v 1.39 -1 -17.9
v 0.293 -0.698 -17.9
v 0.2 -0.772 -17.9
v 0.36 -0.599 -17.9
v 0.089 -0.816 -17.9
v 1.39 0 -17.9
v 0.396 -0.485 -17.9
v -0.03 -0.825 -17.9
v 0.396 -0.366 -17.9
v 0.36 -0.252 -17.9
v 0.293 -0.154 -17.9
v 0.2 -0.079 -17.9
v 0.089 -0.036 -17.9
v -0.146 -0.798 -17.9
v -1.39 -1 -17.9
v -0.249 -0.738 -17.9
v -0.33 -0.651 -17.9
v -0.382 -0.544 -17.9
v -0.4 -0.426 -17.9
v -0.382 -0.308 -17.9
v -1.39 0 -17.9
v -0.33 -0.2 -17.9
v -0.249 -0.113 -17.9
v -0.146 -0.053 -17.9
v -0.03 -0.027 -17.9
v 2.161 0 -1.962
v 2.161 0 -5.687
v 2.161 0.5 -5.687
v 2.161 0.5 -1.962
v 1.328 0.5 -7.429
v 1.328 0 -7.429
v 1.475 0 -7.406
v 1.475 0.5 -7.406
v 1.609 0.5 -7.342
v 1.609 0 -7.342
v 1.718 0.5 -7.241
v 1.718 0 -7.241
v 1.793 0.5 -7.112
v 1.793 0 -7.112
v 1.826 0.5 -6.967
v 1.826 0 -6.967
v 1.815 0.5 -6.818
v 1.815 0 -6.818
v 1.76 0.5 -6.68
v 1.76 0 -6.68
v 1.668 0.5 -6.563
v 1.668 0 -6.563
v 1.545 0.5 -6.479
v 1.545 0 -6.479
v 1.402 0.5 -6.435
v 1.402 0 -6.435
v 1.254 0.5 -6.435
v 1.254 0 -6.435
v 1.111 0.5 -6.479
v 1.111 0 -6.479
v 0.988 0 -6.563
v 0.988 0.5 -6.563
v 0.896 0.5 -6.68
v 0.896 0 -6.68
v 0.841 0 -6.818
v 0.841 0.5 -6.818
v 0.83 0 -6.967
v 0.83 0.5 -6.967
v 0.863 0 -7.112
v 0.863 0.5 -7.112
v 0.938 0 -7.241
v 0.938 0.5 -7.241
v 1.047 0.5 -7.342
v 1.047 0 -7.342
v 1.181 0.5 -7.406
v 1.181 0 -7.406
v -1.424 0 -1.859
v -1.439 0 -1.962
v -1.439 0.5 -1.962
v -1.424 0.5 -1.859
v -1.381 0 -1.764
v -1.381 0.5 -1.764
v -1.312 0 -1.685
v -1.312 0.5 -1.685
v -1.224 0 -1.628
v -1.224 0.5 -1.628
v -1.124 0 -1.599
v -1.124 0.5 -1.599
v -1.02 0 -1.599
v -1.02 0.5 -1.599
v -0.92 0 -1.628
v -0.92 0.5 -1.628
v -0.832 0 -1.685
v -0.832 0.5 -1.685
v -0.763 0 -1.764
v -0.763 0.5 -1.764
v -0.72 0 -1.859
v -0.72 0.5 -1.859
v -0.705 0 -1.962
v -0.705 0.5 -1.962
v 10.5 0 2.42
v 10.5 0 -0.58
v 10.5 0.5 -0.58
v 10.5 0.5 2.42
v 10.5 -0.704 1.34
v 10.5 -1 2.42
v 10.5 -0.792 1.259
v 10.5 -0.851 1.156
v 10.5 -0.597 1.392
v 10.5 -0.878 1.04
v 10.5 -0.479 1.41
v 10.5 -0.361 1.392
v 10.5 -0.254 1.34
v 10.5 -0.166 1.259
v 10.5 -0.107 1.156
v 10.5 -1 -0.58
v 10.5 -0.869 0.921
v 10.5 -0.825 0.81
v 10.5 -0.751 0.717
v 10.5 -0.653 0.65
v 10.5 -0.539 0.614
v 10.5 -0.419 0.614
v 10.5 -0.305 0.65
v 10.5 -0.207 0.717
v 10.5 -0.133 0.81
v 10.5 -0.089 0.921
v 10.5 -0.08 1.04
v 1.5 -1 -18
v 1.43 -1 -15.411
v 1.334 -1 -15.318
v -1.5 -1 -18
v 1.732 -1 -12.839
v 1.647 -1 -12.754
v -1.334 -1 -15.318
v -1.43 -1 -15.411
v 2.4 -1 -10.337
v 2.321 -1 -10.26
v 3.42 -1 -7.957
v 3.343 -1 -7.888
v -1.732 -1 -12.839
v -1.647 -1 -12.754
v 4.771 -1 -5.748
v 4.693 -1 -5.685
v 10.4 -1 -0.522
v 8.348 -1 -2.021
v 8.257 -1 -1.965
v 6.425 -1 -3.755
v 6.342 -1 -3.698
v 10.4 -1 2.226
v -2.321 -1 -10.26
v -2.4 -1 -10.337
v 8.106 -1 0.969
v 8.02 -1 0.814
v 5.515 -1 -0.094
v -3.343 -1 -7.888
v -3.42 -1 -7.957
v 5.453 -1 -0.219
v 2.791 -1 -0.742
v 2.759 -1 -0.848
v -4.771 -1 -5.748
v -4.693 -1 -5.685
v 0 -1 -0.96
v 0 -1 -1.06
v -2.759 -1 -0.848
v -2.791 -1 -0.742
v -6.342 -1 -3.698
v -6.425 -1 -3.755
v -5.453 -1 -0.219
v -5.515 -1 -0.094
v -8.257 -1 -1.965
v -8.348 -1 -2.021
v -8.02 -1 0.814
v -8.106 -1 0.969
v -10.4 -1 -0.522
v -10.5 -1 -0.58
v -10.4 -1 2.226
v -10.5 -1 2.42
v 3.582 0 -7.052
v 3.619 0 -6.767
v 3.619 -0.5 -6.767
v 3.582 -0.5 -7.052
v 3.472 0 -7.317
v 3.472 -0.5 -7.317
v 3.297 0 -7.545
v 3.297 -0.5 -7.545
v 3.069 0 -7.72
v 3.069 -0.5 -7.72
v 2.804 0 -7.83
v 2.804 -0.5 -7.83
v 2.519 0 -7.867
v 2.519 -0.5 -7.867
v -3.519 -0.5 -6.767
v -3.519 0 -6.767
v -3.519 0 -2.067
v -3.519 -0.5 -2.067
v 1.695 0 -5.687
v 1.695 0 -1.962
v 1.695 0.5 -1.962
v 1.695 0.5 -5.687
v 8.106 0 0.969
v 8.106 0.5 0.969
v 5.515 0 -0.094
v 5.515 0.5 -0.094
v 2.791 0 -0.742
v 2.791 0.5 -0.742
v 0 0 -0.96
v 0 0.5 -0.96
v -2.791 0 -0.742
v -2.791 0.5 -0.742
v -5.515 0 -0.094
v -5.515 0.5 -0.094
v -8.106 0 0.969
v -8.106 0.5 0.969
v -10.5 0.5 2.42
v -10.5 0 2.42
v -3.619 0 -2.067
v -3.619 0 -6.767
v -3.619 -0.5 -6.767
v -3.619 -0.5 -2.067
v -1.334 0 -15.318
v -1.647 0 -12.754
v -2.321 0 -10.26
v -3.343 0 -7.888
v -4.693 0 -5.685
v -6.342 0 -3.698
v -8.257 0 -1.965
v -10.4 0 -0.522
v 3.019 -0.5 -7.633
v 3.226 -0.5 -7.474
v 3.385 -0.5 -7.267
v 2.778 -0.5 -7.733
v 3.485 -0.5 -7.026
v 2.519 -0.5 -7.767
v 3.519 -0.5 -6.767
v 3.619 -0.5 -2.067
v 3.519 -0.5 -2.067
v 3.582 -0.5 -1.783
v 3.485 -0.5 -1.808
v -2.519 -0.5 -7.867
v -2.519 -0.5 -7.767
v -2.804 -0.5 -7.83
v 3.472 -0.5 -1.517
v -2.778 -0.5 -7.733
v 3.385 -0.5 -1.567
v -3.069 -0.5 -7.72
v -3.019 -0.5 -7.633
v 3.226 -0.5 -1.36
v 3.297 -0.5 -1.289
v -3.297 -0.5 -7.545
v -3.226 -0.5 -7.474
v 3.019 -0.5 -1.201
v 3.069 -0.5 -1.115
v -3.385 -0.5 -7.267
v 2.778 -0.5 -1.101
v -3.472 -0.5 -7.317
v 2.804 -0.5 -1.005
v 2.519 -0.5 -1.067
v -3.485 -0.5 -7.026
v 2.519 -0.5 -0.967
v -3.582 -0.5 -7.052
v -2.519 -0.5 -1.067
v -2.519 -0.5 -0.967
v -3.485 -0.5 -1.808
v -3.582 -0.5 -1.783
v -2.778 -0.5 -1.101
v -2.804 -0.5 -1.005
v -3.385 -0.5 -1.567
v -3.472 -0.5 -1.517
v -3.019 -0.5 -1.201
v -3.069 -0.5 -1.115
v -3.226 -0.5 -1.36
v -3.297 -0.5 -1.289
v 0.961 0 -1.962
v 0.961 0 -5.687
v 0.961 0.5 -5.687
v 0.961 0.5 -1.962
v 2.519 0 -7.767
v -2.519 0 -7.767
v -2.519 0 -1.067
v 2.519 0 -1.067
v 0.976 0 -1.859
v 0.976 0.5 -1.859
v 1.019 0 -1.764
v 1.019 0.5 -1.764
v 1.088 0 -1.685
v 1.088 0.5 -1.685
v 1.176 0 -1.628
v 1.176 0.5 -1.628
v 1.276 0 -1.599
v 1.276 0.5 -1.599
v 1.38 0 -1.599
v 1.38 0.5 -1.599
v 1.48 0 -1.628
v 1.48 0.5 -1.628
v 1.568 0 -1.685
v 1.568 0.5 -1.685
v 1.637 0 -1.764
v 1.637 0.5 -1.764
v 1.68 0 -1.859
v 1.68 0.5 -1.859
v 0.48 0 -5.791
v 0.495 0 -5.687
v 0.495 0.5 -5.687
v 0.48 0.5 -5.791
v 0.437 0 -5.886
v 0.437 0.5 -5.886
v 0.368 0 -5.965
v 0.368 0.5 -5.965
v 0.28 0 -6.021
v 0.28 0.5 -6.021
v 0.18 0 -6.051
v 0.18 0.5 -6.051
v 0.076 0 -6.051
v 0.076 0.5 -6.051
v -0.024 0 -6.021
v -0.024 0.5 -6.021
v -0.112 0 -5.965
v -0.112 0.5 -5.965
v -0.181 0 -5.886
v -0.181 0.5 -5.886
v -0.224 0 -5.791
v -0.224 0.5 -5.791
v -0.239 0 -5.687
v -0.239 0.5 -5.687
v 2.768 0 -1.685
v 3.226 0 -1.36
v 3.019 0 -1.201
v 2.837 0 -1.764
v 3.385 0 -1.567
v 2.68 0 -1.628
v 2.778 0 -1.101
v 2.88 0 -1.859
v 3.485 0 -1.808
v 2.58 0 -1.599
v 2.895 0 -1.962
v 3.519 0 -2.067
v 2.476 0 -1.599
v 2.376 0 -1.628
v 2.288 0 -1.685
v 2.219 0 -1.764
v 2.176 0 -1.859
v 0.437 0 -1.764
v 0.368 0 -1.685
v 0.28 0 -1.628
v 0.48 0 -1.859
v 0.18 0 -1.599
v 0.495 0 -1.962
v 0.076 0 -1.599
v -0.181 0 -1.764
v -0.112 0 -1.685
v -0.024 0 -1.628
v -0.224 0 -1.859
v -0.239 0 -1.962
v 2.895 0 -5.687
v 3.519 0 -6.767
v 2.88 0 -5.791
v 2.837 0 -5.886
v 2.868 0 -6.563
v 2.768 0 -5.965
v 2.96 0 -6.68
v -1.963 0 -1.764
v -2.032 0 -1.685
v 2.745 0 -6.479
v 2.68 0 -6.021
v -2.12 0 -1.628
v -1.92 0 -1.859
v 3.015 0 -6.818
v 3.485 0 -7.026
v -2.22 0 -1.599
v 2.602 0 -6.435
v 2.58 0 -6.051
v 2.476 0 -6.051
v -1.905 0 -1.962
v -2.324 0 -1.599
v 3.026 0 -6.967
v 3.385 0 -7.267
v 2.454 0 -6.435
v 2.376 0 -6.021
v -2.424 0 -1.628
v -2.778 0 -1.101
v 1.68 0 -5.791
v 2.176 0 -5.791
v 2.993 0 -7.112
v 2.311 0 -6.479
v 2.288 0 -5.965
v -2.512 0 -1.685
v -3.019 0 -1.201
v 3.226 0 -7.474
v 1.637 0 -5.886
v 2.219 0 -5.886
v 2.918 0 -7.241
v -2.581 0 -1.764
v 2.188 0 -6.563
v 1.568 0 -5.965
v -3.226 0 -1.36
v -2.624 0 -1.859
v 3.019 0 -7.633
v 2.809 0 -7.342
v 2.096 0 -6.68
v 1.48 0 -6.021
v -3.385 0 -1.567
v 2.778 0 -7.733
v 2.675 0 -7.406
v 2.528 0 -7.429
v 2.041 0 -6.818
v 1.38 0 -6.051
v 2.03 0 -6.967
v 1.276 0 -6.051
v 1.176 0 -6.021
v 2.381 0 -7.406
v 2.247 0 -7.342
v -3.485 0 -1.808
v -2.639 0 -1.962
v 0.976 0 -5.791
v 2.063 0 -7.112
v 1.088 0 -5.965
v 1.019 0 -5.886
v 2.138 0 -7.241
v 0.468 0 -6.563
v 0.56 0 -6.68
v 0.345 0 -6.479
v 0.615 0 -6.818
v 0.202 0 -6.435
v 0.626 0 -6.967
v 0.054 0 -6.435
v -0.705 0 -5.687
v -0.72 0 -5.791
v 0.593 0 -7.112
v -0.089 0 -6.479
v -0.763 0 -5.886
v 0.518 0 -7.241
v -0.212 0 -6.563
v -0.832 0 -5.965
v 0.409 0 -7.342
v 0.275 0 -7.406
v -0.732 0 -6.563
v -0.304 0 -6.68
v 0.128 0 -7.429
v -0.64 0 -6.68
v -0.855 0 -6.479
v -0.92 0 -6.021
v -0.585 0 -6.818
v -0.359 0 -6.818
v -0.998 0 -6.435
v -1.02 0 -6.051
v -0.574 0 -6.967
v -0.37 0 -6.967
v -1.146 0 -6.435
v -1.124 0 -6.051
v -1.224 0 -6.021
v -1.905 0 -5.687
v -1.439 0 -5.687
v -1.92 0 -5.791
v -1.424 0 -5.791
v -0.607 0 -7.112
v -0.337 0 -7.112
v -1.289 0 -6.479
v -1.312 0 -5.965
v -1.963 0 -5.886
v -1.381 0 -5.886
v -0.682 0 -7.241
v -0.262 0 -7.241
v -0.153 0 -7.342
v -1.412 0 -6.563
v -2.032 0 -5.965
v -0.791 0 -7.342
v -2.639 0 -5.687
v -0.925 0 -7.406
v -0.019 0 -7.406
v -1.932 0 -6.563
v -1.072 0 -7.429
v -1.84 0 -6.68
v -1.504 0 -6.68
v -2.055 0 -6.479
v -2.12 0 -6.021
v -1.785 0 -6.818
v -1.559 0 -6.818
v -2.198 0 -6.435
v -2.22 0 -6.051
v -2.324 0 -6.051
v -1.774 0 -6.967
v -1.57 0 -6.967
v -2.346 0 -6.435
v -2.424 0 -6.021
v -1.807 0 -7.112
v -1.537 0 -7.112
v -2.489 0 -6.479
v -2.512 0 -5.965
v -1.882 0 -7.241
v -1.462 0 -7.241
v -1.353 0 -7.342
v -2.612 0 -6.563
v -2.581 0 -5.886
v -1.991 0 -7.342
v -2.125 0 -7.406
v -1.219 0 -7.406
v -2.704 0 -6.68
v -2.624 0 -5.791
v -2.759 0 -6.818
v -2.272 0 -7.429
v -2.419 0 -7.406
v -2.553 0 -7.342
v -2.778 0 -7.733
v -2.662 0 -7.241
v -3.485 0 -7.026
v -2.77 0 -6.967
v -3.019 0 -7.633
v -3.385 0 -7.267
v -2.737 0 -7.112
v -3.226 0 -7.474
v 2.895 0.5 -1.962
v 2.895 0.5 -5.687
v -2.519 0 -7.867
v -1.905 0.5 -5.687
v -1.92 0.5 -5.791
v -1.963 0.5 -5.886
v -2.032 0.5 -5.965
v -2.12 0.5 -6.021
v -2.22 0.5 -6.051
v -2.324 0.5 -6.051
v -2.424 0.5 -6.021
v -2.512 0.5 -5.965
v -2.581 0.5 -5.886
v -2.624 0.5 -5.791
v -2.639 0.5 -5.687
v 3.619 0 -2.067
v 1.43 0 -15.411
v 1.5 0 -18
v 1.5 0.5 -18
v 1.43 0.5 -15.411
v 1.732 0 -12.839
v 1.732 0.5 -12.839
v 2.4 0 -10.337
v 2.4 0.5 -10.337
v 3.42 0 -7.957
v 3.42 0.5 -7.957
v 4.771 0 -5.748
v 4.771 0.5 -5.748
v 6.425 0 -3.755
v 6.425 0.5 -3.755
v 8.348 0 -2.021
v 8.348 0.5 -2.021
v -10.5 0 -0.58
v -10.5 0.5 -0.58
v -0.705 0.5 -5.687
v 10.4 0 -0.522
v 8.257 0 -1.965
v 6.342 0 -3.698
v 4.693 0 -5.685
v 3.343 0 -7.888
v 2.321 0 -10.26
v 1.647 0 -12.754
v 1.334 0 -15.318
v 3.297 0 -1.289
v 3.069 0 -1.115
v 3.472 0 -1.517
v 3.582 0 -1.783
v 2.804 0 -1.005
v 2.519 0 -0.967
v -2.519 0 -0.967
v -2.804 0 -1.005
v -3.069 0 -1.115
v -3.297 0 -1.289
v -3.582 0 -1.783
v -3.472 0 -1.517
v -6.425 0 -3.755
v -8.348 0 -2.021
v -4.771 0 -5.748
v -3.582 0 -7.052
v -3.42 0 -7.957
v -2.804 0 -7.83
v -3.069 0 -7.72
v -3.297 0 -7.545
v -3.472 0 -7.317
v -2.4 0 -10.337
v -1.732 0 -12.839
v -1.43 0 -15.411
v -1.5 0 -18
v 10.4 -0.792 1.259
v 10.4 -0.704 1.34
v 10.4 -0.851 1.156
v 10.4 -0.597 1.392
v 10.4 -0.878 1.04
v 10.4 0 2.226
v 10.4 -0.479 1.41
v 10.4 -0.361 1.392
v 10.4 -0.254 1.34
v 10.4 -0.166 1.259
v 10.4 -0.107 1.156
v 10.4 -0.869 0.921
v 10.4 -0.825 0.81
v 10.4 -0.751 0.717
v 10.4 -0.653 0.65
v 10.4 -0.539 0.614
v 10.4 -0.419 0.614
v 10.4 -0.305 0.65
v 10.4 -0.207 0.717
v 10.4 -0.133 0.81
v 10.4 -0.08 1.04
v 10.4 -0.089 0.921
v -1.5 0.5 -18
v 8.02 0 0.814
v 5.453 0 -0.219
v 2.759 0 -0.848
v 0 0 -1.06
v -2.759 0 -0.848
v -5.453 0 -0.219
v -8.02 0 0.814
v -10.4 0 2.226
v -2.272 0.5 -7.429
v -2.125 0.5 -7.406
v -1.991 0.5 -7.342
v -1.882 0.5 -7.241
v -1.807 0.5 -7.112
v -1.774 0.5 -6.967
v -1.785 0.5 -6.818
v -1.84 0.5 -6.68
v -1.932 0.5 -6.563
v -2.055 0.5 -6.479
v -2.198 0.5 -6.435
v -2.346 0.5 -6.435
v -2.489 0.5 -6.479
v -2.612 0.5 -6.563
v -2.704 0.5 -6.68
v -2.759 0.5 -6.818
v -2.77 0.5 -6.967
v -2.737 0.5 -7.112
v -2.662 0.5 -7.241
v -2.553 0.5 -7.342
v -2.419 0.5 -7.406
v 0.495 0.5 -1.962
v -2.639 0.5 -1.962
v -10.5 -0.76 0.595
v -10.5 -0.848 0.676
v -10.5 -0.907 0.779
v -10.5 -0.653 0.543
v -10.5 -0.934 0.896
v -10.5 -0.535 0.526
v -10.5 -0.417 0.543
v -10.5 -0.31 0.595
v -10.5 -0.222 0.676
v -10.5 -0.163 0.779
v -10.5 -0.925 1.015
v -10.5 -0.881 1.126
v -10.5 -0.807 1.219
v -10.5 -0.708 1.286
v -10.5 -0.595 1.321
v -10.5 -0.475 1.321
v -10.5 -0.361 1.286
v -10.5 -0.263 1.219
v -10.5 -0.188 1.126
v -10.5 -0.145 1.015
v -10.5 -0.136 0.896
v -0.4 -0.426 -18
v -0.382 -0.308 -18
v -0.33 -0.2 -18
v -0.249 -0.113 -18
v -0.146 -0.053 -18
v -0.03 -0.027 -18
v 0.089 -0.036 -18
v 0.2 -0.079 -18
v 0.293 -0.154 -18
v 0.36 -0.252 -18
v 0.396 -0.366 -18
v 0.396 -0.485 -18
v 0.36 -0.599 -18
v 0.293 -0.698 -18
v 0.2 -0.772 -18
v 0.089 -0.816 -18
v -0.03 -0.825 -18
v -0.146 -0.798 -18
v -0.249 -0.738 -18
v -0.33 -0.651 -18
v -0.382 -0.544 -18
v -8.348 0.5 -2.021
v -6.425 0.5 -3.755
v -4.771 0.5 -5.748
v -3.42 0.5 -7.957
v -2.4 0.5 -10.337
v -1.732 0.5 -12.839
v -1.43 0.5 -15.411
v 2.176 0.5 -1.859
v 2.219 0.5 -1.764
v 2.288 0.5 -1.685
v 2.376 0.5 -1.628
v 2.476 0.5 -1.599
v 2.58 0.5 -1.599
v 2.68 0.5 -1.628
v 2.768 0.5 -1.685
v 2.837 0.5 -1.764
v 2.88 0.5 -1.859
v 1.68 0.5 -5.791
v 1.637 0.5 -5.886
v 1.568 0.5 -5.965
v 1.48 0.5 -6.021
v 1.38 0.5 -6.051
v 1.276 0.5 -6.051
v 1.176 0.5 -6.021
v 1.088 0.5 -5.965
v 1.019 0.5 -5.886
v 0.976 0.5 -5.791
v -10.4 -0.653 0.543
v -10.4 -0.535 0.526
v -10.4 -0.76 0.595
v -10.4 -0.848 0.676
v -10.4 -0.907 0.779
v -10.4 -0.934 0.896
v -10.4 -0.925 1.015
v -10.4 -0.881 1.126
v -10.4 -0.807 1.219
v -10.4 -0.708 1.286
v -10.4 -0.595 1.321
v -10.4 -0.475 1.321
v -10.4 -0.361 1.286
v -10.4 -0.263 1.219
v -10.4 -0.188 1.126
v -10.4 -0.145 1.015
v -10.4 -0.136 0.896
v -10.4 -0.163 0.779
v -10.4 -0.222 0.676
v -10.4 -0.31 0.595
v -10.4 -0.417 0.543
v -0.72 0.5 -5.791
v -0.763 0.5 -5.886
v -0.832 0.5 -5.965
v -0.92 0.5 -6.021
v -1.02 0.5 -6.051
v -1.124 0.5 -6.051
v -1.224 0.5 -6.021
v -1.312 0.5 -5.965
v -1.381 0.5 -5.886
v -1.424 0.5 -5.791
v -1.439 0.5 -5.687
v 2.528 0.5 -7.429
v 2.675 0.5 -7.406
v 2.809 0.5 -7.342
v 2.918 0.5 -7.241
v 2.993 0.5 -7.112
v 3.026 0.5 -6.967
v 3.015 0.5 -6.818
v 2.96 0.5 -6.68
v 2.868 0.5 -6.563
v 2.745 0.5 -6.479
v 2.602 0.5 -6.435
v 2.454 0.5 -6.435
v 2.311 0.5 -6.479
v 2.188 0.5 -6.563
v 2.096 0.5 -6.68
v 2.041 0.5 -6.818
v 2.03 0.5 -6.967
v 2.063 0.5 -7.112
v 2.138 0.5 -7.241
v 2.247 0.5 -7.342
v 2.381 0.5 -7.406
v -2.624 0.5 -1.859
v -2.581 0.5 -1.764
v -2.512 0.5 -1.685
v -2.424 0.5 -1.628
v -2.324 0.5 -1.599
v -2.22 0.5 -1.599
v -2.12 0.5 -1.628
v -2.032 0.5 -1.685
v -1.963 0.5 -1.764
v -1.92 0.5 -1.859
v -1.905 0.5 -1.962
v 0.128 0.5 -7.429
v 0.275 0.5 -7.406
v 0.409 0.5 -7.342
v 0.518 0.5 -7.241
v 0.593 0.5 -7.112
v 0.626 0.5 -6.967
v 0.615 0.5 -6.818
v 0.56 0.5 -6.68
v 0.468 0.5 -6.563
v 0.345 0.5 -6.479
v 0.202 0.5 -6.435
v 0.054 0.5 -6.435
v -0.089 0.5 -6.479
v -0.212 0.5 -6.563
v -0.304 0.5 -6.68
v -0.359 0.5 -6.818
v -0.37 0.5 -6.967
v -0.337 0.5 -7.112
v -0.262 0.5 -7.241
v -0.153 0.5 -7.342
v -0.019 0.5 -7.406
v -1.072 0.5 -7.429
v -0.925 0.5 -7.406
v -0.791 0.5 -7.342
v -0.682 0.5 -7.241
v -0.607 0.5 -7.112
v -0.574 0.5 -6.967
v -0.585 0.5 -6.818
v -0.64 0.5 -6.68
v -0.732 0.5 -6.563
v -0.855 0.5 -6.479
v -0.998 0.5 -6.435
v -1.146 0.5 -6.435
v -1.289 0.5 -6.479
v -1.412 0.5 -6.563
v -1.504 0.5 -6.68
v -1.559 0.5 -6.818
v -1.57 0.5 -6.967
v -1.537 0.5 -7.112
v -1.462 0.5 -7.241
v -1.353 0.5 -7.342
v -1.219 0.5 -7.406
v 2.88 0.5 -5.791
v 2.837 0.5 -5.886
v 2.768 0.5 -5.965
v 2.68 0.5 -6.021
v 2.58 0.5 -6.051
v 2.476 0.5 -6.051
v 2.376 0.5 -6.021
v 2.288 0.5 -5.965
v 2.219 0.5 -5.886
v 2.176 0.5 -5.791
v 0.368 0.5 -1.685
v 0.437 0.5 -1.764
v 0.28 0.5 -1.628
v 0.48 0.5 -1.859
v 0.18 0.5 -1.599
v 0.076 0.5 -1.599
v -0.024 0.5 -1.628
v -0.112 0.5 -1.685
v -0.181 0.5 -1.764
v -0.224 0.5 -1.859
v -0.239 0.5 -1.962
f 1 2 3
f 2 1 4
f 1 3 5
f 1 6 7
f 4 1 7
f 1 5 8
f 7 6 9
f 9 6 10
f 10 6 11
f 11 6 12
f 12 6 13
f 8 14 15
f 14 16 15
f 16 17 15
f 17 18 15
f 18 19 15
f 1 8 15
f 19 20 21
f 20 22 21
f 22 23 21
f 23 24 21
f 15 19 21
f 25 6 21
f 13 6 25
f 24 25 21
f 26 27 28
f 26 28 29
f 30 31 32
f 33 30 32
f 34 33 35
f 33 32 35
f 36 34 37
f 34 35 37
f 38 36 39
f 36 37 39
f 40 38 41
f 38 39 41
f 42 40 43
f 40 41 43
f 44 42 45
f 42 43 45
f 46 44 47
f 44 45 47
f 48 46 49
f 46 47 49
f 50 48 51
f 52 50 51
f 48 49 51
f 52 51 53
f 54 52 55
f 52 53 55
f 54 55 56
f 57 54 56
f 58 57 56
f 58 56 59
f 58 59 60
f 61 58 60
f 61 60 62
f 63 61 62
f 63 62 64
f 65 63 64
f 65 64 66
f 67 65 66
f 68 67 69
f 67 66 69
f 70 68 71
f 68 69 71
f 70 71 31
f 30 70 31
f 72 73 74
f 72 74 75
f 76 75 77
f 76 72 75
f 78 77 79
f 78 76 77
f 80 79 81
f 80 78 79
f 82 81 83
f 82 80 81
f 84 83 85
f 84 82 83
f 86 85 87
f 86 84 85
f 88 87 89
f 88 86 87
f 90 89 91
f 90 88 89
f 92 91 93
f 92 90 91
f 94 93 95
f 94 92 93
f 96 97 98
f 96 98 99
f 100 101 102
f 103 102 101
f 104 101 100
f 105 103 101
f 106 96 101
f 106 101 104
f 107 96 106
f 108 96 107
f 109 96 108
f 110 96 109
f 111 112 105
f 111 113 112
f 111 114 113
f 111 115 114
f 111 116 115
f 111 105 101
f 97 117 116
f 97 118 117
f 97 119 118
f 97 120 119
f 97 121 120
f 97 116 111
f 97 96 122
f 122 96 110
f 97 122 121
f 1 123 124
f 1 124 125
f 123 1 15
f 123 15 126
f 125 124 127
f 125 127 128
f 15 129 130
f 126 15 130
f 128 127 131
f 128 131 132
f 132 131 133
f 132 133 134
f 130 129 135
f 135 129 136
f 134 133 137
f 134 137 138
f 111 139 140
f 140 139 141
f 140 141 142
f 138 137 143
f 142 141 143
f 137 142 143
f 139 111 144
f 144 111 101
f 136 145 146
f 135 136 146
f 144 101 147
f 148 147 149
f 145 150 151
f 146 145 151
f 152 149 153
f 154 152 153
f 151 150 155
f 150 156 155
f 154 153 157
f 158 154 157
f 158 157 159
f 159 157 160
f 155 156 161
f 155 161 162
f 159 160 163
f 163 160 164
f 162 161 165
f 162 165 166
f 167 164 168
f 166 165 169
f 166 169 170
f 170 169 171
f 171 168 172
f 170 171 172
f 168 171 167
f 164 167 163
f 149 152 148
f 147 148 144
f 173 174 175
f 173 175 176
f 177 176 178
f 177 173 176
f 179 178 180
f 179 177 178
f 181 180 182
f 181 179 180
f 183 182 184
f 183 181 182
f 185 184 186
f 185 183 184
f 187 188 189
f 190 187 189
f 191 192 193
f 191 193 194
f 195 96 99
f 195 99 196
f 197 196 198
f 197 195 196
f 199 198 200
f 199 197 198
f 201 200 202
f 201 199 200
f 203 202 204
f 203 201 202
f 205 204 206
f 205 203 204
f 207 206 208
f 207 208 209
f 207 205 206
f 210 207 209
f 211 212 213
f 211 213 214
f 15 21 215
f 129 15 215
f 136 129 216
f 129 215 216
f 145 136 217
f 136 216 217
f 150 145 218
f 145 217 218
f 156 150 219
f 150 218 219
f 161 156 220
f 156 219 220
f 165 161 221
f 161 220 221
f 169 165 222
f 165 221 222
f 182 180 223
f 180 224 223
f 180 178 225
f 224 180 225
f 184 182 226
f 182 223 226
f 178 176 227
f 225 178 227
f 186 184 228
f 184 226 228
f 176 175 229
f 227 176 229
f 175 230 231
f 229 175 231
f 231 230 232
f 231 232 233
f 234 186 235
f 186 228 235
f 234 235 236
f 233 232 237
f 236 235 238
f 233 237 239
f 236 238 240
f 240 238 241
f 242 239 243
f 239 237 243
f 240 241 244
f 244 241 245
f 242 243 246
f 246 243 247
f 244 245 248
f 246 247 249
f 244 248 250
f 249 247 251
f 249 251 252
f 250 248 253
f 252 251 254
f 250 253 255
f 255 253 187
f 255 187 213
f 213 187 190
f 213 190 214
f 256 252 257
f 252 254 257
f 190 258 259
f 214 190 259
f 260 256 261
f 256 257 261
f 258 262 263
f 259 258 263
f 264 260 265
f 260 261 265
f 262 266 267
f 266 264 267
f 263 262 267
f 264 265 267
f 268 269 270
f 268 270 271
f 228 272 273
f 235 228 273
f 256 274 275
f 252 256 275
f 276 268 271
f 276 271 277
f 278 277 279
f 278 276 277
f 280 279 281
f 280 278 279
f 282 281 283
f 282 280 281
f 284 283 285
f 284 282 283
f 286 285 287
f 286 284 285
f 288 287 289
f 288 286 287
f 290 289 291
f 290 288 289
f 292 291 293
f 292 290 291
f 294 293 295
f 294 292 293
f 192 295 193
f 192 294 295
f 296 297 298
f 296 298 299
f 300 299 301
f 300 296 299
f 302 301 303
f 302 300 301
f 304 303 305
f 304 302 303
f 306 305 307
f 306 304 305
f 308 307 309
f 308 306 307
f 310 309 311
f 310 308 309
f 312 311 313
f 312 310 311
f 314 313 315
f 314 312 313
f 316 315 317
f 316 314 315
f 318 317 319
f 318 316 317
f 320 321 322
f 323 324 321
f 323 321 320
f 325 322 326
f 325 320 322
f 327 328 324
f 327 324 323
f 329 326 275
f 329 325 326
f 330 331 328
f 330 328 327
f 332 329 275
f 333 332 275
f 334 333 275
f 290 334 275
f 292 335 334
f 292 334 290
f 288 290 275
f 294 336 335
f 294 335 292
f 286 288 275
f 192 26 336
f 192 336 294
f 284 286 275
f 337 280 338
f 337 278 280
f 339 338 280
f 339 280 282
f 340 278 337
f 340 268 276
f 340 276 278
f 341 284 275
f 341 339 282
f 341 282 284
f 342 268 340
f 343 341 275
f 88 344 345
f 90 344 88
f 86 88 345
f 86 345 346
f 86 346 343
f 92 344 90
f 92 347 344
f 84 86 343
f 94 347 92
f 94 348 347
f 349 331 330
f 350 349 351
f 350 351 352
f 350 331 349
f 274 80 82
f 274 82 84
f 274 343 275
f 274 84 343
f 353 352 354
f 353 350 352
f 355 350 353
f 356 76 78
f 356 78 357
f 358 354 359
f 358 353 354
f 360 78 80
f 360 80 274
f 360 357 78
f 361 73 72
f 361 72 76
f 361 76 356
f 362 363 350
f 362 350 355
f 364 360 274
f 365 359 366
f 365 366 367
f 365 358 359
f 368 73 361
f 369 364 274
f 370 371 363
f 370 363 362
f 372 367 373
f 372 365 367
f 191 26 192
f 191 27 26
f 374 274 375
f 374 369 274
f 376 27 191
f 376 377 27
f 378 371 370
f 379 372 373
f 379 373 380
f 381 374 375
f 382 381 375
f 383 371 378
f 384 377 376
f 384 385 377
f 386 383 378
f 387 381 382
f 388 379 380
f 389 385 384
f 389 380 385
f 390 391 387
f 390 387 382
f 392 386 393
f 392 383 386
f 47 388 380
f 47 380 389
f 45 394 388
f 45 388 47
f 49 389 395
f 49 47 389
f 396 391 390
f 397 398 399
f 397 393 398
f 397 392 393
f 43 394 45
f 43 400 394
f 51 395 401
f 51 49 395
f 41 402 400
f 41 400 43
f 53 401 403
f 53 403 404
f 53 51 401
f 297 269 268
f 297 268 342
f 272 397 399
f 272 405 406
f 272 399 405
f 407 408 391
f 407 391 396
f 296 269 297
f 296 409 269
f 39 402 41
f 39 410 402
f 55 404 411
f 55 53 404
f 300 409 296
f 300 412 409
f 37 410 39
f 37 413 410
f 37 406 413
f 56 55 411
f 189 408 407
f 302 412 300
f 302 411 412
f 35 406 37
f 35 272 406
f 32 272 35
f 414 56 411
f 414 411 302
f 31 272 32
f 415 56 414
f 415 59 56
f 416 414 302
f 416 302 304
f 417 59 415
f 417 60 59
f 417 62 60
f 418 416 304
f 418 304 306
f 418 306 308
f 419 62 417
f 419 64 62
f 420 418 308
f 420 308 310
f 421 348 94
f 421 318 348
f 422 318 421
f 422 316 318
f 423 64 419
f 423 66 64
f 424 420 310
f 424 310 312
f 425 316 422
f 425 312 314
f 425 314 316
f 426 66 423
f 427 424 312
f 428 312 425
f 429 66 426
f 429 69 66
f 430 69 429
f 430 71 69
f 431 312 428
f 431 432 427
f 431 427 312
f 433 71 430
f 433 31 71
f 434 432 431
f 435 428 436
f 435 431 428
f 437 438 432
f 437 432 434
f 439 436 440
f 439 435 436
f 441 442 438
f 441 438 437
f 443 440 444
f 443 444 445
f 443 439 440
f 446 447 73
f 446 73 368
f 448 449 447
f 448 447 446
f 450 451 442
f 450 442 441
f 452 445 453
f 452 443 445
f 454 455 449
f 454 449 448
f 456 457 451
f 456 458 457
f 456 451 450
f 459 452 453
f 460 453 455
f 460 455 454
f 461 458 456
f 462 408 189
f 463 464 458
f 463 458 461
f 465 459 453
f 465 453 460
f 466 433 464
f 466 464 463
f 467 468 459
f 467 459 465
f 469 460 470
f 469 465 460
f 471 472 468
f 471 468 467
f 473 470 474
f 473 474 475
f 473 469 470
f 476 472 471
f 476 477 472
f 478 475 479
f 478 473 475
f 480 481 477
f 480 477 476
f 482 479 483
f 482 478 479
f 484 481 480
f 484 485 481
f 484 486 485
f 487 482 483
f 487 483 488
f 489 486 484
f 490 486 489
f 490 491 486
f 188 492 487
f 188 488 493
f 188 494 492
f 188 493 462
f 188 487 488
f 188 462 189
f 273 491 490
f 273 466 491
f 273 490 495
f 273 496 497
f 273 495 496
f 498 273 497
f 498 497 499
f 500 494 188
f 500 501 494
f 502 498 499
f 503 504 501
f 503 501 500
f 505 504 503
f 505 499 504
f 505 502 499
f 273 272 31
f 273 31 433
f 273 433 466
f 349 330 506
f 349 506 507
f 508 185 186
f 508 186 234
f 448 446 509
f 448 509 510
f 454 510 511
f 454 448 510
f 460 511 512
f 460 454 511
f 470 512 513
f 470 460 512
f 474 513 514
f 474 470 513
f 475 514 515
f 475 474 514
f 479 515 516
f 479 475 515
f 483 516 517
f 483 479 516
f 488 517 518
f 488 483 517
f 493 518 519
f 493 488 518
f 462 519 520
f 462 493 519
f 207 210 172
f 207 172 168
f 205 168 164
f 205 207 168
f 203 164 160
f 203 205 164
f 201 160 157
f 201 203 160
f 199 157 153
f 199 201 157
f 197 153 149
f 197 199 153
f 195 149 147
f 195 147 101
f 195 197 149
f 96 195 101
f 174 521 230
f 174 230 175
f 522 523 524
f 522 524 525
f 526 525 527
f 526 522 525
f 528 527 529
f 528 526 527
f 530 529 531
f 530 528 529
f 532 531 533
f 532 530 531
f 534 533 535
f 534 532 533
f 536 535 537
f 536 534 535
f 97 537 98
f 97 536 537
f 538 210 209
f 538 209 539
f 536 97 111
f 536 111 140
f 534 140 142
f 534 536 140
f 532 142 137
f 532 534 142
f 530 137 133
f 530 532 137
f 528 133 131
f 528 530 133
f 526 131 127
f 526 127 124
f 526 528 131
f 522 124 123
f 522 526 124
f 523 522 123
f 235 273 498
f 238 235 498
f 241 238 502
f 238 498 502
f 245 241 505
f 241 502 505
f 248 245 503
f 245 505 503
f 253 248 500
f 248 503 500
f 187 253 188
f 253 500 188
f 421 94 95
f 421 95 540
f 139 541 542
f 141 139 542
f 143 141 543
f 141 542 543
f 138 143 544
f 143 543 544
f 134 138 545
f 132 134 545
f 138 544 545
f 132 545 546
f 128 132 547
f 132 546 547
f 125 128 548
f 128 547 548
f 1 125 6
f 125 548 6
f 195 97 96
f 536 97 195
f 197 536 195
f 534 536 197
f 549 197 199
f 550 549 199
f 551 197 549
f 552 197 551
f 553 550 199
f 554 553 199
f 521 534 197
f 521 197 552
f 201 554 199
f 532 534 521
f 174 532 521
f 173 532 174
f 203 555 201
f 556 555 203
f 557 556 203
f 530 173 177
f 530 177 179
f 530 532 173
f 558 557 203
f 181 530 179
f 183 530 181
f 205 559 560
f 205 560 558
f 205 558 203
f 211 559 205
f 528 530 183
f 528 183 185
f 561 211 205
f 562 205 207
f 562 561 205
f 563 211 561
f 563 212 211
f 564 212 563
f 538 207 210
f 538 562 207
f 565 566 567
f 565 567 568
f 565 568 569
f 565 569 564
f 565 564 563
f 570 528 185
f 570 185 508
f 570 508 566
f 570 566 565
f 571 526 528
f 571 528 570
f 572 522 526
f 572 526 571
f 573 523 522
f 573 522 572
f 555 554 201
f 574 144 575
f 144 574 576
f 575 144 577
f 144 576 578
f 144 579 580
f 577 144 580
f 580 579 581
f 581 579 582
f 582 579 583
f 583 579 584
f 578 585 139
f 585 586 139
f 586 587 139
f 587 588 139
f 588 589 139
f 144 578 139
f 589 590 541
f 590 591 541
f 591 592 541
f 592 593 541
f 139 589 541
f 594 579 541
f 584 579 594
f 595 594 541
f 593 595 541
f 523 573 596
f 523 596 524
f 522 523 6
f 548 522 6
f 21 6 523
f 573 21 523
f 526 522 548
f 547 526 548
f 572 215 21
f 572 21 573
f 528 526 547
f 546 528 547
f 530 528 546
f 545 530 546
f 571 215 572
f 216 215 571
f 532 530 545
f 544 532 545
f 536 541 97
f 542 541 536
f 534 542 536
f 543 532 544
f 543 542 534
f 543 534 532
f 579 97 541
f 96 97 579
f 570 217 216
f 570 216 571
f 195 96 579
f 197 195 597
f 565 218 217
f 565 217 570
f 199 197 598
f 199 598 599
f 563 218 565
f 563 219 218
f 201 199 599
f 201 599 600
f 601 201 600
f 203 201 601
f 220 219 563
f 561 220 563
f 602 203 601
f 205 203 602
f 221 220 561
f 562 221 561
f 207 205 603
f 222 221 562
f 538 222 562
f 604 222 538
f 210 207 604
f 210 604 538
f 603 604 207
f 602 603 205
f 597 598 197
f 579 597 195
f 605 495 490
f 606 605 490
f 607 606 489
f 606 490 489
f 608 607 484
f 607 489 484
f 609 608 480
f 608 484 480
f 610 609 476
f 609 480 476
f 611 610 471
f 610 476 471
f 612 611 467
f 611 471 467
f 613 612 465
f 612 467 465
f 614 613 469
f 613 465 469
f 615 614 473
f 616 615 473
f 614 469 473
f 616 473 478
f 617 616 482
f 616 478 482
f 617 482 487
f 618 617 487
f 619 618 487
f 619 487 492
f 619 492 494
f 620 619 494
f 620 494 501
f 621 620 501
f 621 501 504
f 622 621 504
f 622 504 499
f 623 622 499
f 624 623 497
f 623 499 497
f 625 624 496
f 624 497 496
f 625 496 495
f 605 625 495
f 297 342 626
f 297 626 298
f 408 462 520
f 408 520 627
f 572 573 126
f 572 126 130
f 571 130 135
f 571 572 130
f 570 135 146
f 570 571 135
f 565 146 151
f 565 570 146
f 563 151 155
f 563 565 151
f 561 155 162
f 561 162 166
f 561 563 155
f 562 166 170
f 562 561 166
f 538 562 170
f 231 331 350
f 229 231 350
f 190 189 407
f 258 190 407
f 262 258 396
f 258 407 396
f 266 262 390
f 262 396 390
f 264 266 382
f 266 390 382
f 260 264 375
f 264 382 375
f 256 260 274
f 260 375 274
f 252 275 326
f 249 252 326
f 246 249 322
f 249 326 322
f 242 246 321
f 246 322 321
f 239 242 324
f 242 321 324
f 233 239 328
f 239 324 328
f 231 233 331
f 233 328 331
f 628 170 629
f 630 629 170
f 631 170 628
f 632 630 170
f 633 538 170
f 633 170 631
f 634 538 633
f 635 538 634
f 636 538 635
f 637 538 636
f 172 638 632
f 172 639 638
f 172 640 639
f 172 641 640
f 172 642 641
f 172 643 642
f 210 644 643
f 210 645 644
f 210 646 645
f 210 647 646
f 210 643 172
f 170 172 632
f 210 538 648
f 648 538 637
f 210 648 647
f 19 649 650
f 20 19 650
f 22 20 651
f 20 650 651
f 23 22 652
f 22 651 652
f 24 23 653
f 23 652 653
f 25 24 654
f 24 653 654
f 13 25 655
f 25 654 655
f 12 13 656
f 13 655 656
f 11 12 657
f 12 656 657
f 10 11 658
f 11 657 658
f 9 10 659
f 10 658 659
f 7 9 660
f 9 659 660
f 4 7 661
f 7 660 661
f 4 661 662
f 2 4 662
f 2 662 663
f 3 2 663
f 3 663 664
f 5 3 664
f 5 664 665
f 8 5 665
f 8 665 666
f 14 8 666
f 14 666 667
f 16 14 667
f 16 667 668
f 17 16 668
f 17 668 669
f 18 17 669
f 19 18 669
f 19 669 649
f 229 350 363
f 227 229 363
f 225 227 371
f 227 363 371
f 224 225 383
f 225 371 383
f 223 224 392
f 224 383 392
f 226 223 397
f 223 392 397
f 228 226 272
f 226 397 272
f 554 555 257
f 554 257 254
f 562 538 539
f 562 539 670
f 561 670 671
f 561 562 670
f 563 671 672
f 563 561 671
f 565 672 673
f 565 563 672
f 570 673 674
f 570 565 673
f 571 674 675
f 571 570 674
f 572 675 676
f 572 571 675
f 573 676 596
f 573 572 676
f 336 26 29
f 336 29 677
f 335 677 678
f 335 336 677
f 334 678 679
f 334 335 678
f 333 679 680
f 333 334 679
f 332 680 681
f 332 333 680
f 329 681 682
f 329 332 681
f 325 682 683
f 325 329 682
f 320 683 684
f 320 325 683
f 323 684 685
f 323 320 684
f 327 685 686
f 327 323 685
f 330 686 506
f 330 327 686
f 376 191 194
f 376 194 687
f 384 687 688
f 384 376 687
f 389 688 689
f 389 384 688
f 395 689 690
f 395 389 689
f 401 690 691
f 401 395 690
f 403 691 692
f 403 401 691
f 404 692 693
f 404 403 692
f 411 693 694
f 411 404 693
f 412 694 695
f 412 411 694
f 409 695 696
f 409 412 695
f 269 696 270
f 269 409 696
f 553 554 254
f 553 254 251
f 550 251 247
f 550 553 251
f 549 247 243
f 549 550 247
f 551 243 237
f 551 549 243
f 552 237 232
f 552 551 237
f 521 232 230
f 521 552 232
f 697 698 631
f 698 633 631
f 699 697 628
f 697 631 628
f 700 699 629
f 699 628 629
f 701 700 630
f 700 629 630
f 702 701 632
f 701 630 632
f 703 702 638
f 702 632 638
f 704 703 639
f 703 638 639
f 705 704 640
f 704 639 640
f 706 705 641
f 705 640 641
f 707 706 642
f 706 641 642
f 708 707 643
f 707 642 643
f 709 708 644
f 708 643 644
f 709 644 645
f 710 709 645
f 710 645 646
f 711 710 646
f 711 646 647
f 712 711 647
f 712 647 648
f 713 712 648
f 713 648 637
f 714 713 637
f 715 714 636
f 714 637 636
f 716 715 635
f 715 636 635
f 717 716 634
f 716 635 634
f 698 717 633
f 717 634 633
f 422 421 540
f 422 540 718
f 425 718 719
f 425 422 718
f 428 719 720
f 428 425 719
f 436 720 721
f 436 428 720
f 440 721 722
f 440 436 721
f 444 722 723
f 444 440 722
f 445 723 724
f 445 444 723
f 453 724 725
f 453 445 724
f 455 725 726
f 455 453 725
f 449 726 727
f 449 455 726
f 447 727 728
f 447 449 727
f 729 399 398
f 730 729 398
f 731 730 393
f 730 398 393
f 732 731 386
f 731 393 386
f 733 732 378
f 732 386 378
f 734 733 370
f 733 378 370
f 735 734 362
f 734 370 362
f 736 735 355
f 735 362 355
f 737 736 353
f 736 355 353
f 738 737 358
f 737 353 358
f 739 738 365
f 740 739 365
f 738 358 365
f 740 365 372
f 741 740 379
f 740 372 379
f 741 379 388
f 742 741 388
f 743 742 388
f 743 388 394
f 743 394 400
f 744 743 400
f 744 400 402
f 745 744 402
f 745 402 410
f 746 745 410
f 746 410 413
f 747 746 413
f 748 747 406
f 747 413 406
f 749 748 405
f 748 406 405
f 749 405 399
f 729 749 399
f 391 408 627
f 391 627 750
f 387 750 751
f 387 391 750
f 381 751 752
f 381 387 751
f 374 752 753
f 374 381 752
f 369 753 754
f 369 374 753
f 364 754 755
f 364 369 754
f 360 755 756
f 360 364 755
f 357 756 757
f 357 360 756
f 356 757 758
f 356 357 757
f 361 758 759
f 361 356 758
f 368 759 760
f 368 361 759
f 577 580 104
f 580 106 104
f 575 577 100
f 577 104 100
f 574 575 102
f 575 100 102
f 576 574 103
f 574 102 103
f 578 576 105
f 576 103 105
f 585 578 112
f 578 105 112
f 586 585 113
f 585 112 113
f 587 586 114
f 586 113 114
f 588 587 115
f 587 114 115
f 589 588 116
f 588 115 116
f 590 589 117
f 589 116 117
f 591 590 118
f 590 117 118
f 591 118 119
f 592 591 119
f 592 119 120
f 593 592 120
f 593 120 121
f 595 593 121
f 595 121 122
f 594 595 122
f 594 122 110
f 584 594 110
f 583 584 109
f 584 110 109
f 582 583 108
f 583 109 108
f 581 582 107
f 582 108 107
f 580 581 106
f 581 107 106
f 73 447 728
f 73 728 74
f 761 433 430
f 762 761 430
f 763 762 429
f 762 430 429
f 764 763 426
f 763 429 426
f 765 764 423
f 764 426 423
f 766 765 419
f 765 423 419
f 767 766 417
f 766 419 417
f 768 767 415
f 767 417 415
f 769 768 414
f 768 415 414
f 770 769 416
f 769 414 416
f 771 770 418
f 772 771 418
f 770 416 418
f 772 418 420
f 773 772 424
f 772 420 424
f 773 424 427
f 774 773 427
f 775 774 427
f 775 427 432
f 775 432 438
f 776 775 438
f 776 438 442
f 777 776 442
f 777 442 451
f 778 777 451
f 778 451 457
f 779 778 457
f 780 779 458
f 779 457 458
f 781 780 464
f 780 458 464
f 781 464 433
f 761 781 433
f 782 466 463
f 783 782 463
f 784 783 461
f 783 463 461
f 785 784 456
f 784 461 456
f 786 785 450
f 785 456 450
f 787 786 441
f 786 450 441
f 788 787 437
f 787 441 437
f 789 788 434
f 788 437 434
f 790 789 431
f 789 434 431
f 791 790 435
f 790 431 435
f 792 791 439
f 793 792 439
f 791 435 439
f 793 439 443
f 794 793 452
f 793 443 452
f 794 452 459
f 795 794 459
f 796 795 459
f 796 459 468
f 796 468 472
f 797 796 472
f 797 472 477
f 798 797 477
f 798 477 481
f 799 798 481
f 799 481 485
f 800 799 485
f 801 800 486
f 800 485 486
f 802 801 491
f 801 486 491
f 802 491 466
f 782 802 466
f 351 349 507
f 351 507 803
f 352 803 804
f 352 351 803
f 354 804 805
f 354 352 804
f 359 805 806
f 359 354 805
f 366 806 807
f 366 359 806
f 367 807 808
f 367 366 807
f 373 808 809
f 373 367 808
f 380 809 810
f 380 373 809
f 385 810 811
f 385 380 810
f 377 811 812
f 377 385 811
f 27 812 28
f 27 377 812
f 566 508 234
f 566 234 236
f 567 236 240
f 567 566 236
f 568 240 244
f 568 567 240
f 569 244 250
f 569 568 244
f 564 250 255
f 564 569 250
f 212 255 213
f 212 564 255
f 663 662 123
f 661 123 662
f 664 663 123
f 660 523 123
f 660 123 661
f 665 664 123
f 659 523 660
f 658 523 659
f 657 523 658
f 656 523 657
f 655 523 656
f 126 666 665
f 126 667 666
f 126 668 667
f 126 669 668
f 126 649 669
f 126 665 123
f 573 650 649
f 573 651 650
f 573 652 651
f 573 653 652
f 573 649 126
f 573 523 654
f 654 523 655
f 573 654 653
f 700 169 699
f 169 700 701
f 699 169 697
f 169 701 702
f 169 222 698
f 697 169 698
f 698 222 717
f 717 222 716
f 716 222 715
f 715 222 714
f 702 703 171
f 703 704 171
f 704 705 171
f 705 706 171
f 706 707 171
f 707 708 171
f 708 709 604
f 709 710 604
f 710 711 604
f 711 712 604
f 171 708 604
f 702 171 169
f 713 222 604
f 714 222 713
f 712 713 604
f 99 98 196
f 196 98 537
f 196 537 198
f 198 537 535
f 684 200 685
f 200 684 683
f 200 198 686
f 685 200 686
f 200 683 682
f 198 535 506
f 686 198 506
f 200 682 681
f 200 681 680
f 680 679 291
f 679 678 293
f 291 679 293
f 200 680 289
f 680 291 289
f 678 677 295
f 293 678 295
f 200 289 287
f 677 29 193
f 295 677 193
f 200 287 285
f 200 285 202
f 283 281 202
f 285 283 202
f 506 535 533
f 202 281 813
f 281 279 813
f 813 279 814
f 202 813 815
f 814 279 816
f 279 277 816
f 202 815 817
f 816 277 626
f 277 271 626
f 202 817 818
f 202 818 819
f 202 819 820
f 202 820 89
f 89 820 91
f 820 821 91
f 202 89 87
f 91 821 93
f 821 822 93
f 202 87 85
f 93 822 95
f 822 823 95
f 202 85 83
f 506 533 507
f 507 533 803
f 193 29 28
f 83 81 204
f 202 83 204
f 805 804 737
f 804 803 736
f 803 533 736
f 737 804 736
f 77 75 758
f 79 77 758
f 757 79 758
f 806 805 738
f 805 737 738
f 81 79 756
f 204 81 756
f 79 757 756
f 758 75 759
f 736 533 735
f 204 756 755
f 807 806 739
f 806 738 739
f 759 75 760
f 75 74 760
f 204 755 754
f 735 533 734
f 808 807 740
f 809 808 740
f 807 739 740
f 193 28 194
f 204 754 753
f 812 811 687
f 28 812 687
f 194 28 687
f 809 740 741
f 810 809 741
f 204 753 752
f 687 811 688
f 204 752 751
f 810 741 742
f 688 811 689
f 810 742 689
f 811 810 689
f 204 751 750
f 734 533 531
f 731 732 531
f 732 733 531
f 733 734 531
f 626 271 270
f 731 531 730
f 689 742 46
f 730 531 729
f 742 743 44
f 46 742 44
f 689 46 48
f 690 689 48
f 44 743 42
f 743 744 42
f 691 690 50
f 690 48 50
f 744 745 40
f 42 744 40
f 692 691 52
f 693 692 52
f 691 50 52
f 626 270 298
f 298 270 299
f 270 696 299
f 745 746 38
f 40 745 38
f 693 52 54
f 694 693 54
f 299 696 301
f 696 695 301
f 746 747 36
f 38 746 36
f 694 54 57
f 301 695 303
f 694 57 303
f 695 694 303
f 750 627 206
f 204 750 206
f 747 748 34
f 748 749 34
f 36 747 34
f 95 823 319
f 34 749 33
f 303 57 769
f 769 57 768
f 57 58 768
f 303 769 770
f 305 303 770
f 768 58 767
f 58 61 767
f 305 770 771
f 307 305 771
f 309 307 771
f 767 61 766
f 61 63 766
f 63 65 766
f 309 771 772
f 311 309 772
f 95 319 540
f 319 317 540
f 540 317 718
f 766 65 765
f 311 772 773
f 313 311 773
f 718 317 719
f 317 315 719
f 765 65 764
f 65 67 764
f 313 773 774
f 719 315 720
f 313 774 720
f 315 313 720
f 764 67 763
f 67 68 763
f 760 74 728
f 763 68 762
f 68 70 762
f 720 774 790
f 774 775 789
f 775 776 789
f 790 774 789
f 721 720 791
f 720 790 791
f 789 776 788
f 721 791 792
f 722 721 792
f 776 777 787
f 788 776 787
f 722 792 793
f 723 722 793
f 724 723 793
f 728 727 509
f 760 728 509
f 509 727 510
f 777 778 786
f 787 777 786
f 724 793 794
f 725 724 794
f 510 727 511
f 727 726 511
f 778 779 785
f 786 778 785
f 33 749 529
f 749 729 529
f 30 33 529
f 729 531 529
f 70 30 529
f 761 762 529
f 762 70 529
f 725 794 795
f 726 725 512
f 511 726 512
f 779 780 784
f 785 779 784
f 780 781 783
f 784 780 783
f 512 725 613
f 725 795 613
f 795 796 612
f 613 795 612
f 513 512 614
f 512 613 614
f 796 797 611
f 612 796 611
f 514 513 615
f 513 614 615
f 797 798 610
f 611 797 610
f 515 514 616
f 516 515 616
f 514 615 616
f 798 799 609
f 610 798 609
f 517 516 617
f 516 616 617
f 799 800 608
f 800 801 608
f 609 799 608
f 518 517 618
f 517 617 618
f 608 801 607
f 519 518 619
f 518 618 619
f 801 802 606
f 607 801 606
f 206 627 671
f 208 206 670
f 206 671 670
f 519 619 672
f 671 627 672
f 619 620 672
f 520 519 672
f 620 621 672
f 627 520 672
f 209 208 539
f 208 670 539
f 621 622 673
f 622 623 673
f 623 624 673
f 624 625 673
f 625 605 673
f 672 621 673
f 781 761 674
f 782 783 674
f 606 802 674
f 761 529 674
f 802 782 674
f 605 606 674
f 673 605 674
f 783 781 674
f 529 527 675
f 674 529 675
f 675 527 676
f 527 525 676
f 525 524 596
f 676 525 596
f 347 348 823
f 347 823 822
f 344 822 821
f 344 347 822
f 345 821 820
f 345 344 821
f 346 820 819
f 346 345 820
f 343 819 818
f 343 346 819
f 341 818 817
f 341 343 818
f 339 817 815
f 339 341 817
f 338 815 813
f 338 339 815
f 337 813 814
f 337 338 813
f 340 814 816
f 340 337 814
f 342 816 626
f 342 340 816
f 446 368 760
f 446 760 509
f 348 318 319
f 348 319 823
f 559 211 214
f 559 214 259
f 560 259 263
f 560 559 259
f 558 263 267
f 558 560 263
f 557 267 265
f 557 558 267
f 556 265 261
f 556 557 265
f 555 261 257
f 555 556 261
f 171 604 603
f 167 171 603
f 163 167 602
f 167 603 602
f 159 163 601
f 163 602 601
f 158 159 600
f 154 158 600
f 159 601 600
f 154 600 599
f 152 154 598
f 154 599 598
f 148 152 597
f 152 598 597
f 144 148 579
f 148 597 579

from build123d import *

# Parameters (mm, degrees)
BOSS_EXTRUDE1_DEPTH = 0.5
EXTRUDE_THIN2_DEPTH = 0.5
SKETCH4_R           = 0.499321112
CUT_EXTRUDE1_DEPTH  = 0.5
EXTRUDE_THIN3_DEPTH = 1
SKETCH12_R          = 0.4
CUT_EXTRUDE2_DEPTH  = 0.5
SKETCH13_R          = 0.4
CUT_EXTRUDE3_DEPTH  = 0.5
SKETCH14_R          = 0.4
CUT_EXTRUDE4_DEPTH  = 1


with BuildPart() as part:
    # Sketch1 → Boss-Extrude1 (new body)
    with BuildSketch(Plane(origin=(0, 0, 0), x_dir=(1, 0, 0), z_dir=(0, 1, 0))):
        with BuildLine():
            Line((10.5, 0.58), (10.5, -2.42))
            ThreePointArc((10.5, -2.42), (0, 0.959808483), (-10.5, -2.42))
            Line((-10.5, -2.42), (-10.5, 0.58))
            ThreePointArc((-10.5, 0.58), (-3.419893457, 7.956994323), (-1.5, 18))
            Line((-1.5, 18), (1.5, 18))
            ThreePointArc((1.5, 18), (3.419893457, 7.956994323), (10.5, 0.58))
        make_face()
    extrude(amount=BOSS_EXTRUDE1_DEPTH)

    # Sketch2 → Extrude-Thin2 (add)
    with BuildSketch(Plane.XZ):
        with BuildLine():
            Line((3.619286336, -2.06724443), (3.619286336, -6.76738737))
            ThreePointArc((3.619286336, -6.76738737), (3.297103795, -7.545204829), (2.519286336, -7.86738737))
            Line((2.519286336, -7.86738737), (-2.519286336, -7.86738737))
            ThreePointArc((-2.519286336, -7.86738737), (-3.297103795, -7.545204829), (-3.619286336, -6.76738737))
            Line((-3.619286336, -6.76738737), (-3.619286336, -2.06724443))
            ThreePointArc((-3.619286336, -2.06724443), (-3.297103795, -1.289426971), (-2.519286336, -0.96724443))
            Line((-2.519286336, -0.96724443), (2.519286336, -0.96724443))
            ThreePointArc((2.519286336, -0.96724443), (3.297103795, -1.289426971), (3.619286336, -2.06724443))
        make_face()
        with BuildLine():
            Line((3.519286336, -2.06724443), (3.519286336, -6.76738737))
            ThreePointArc((3.519286336, -6.76738737), (3.226393117, -7.474494151), (2.519286336, -7.76738737))
            Line((2.519286336, -7.76738737), (-2.519286336, -7.76738737))
            ThreePointArc((-2.519286336, -7.76738737), (-3.226393117, -7.474494151), (-3.519286336, -6.76738737))
            Line((-3.519286336, -6.76738737), (-3.519286336, -2.06724443))
            ThreePointArc((-3.519286336, -2.06724443), (-3.226393117, -1.360137649), (-2.519286336, -1.06724443))
            Line((-2.519286336, -1.06724443), (2.519286336, -1.06724443))
            ThreePointArc((2.519286336, -1.06724443), (3.226393117, -1.360137649), (3.519286336, -2.06724443))
        make_face(mode=Mode.SUBTRACT)
    extrude(amount=EXTRUDE_THIN2_DEPTH)

    # Sketch4 → Cut-Extrude1 (cut)
    with BuildSketch(Plane.XZ):
        with Locations(Location((-2.271975482, -6.929189414, 0), (0, 0, 270))):
            Circle(SKETCH4_R)
        with Locations(Location((-1.071975482, -6.929189414, 0), (0, 0, 270))):
            Circle(SKETCH4_R)
        with Locations(Location((0.128024518, -6.929189414, 0), (0, 0, 270))):
            Circle(SKETCH4_R)
        with Locations(Location((1.328024518, -6.929189414, 0), (0, 0, 270))):
            Circle(SKETCH4_R)
        with Locations(Location((2.528024518, -6.929189414, 0), (0, 0, 270))):
            Circle(SKETCH4_R)
        with BuildLine():
            Line((-1.905072609, -1.961888982), (-1.905072609, -5.687364306))
            ThreePointArc((-1.905072609, -5.687364306), (-2.271975482, -6.054267179), (-2.638878355, -5.687364306))
            Line((-2.638878355, -5.687364306), (-2.638878355, -1.961888982))
            ThreePointArc((-2.638878355, -1.961888982), (-2.271975482, -1.594986109), (-1.905072609, -1.961888982))
        make_face()
        with BuildLine():
            Line((-0.705072609, -1.961888982), (-0.705072609, -5.687364306))
            ThreePointArc((-0.705072609, -5.687364306), (-1.071975482, -6.054267179), (-1.438878355, -5.687364306))
            Line((-1.438878355, -5.687364306), (-1.438878355, -1.961888982))
            ThreePointArc((-1.438878355, -1.961888982), (-1.071975482, -1.594986109), (-0.705072609, -1.961888982))
        make_face()
        with BuildLine():
            Line((0.494927391, -1.961888982), (0.494927391, -5.687364306))
            ThreePointArc((0.494927391, -5.687364306), (0.128024518, -6.054267179), (-0.238878355, -5.687364306))
            Line((-0.238878355, -5.687364306), (-0.238878355, -1.961888982))
            ThreePointArc((-0.238878355, -1.961888982), (0.128024518, -1.594986109), (0.494927391, -1.961888982))
        make_face()
        with BuildLine():
            Line((1.694927391, -1.961888982), (1.694927391, -5.687364306))
            ThreePointArc((1.694927391, -5.687364306), (1.328024518, -6.054267179), (0.961121645, -5.687364306))
            Line((0.961121645, -5.687364306), (0.961121645, -1.961888982))
            ThreePointArc((0.961121645, -1.961888982), (1.328024518, -1.594986109), (1.694927391, -1.961888982))
        make_face()
        with BuildLine():
            Line((2.894927391, -1.961888982), (2.894927391, -5.687364306))
            ThreePointArc((2.894927391, -5.687364306), (2.528024518, -6.054267179), (2.161121645, -5.687364306))
            Line((2.161121645, -5.687364306), (2.161121645, -1.961888982))
            ThreePointArc((2.161121645, -1.961888982), (2.528024518, -1.594986109), (2.894927391, -1.961888982))
        make_face()
    extrude(amount=-CUT_EXTRUDE1_DEPTH, mode=Mode.SUBTRACT)


with BuildPart() as body_2:
    # Sketch6 → Extrude-Thin3 (new body)
    with BuildSketch(Plane.XZ):
        with BuildLine():
            Line((-10.5, -0.58), (-10.5, 2.42))
            ThreePointArc((-10.5, 2.42), (0, -0.959808483), (10.5, 2.42))
            Line((10.5, 2.42), (10.5, -0.58))
            ThreePointArc((10.5, -0.58), (3.419893457, -7.956994323), (1.5, -18))
            Line((1.5, -18), (-1.5, -18))
            ThreePointArc((-1.5, -18), (-3.419893457, -7.956994323), (-10.5, -0.58))
        make_face()
        with BuildLine():
            Line((-10.4, -0.521994843), (-10.4, 2.226346642))
            ThreePointArc((-10.4, 2.226346642), (0, -1.059808483), (10.4, 2.226346642))
            Line((10.4, 2.226346642), (10.4, -0.521994843))
            ThreePointArc((10.4, -0.521994843), (3.343055425, -7.887897883), (1.389902711, -17.9))
            Line((1.389902711, -17.9), (-1.389902711, -17.9))
            ThreePointArc((-1.389902711, -17.9), (-3.343055425, -7.887897883), (-10.4, -0.521994843))
        make_face(mode=Mode.SUBTRACT)
    extrude(amount=EXTRUDE_THIN3_DEPTH)

    # Sketch12 → Cut-Extrude2 (cut, symmetric)
    with BuildSketch(Plane.ZY.offset(10.5)):
        with Locations(Location((0.925556485, -0.534903511, 0), (0, 0, 180))):
            Circle(SKETCH12_R)
    extrude(amount=CUT_EXTRUDE2_DEPTH, both=True, mode=Mode.SUBTRACT)

    # Sketch13 → Cut-Extrude3 (cut, symmetric)
    with BuildSketch(Plane(origin=(10.5, 0, 0), x_dir=(0, 0, -1), z_dir=(1, 0, 0))):
        with Locations(Location((-1.009896001, -0.478993576, 0), (0, 0, 180))):
            Circle(SKETCH13_R)
    extrude(amount=CUT_EXTRUDE3_DEPTH, both=True, mode=Mode.SUBTRACT)

    # Sketch14 → Cut-Extrude4 (cut)
    with BuildSketch(Plane(origin=(0, 0, -18), x_dir=(-1, 0, 0), z_dir=(0, 0, -1))):
        with Locations((0, -0.425681427)):
            Circle(SKETCH14_R)
    extrude(amount=-CUT_EXTRUDE4_DEPTH, mode=Mode.SUBTRACT)


solid = Compound([part.part, body_2.part])
